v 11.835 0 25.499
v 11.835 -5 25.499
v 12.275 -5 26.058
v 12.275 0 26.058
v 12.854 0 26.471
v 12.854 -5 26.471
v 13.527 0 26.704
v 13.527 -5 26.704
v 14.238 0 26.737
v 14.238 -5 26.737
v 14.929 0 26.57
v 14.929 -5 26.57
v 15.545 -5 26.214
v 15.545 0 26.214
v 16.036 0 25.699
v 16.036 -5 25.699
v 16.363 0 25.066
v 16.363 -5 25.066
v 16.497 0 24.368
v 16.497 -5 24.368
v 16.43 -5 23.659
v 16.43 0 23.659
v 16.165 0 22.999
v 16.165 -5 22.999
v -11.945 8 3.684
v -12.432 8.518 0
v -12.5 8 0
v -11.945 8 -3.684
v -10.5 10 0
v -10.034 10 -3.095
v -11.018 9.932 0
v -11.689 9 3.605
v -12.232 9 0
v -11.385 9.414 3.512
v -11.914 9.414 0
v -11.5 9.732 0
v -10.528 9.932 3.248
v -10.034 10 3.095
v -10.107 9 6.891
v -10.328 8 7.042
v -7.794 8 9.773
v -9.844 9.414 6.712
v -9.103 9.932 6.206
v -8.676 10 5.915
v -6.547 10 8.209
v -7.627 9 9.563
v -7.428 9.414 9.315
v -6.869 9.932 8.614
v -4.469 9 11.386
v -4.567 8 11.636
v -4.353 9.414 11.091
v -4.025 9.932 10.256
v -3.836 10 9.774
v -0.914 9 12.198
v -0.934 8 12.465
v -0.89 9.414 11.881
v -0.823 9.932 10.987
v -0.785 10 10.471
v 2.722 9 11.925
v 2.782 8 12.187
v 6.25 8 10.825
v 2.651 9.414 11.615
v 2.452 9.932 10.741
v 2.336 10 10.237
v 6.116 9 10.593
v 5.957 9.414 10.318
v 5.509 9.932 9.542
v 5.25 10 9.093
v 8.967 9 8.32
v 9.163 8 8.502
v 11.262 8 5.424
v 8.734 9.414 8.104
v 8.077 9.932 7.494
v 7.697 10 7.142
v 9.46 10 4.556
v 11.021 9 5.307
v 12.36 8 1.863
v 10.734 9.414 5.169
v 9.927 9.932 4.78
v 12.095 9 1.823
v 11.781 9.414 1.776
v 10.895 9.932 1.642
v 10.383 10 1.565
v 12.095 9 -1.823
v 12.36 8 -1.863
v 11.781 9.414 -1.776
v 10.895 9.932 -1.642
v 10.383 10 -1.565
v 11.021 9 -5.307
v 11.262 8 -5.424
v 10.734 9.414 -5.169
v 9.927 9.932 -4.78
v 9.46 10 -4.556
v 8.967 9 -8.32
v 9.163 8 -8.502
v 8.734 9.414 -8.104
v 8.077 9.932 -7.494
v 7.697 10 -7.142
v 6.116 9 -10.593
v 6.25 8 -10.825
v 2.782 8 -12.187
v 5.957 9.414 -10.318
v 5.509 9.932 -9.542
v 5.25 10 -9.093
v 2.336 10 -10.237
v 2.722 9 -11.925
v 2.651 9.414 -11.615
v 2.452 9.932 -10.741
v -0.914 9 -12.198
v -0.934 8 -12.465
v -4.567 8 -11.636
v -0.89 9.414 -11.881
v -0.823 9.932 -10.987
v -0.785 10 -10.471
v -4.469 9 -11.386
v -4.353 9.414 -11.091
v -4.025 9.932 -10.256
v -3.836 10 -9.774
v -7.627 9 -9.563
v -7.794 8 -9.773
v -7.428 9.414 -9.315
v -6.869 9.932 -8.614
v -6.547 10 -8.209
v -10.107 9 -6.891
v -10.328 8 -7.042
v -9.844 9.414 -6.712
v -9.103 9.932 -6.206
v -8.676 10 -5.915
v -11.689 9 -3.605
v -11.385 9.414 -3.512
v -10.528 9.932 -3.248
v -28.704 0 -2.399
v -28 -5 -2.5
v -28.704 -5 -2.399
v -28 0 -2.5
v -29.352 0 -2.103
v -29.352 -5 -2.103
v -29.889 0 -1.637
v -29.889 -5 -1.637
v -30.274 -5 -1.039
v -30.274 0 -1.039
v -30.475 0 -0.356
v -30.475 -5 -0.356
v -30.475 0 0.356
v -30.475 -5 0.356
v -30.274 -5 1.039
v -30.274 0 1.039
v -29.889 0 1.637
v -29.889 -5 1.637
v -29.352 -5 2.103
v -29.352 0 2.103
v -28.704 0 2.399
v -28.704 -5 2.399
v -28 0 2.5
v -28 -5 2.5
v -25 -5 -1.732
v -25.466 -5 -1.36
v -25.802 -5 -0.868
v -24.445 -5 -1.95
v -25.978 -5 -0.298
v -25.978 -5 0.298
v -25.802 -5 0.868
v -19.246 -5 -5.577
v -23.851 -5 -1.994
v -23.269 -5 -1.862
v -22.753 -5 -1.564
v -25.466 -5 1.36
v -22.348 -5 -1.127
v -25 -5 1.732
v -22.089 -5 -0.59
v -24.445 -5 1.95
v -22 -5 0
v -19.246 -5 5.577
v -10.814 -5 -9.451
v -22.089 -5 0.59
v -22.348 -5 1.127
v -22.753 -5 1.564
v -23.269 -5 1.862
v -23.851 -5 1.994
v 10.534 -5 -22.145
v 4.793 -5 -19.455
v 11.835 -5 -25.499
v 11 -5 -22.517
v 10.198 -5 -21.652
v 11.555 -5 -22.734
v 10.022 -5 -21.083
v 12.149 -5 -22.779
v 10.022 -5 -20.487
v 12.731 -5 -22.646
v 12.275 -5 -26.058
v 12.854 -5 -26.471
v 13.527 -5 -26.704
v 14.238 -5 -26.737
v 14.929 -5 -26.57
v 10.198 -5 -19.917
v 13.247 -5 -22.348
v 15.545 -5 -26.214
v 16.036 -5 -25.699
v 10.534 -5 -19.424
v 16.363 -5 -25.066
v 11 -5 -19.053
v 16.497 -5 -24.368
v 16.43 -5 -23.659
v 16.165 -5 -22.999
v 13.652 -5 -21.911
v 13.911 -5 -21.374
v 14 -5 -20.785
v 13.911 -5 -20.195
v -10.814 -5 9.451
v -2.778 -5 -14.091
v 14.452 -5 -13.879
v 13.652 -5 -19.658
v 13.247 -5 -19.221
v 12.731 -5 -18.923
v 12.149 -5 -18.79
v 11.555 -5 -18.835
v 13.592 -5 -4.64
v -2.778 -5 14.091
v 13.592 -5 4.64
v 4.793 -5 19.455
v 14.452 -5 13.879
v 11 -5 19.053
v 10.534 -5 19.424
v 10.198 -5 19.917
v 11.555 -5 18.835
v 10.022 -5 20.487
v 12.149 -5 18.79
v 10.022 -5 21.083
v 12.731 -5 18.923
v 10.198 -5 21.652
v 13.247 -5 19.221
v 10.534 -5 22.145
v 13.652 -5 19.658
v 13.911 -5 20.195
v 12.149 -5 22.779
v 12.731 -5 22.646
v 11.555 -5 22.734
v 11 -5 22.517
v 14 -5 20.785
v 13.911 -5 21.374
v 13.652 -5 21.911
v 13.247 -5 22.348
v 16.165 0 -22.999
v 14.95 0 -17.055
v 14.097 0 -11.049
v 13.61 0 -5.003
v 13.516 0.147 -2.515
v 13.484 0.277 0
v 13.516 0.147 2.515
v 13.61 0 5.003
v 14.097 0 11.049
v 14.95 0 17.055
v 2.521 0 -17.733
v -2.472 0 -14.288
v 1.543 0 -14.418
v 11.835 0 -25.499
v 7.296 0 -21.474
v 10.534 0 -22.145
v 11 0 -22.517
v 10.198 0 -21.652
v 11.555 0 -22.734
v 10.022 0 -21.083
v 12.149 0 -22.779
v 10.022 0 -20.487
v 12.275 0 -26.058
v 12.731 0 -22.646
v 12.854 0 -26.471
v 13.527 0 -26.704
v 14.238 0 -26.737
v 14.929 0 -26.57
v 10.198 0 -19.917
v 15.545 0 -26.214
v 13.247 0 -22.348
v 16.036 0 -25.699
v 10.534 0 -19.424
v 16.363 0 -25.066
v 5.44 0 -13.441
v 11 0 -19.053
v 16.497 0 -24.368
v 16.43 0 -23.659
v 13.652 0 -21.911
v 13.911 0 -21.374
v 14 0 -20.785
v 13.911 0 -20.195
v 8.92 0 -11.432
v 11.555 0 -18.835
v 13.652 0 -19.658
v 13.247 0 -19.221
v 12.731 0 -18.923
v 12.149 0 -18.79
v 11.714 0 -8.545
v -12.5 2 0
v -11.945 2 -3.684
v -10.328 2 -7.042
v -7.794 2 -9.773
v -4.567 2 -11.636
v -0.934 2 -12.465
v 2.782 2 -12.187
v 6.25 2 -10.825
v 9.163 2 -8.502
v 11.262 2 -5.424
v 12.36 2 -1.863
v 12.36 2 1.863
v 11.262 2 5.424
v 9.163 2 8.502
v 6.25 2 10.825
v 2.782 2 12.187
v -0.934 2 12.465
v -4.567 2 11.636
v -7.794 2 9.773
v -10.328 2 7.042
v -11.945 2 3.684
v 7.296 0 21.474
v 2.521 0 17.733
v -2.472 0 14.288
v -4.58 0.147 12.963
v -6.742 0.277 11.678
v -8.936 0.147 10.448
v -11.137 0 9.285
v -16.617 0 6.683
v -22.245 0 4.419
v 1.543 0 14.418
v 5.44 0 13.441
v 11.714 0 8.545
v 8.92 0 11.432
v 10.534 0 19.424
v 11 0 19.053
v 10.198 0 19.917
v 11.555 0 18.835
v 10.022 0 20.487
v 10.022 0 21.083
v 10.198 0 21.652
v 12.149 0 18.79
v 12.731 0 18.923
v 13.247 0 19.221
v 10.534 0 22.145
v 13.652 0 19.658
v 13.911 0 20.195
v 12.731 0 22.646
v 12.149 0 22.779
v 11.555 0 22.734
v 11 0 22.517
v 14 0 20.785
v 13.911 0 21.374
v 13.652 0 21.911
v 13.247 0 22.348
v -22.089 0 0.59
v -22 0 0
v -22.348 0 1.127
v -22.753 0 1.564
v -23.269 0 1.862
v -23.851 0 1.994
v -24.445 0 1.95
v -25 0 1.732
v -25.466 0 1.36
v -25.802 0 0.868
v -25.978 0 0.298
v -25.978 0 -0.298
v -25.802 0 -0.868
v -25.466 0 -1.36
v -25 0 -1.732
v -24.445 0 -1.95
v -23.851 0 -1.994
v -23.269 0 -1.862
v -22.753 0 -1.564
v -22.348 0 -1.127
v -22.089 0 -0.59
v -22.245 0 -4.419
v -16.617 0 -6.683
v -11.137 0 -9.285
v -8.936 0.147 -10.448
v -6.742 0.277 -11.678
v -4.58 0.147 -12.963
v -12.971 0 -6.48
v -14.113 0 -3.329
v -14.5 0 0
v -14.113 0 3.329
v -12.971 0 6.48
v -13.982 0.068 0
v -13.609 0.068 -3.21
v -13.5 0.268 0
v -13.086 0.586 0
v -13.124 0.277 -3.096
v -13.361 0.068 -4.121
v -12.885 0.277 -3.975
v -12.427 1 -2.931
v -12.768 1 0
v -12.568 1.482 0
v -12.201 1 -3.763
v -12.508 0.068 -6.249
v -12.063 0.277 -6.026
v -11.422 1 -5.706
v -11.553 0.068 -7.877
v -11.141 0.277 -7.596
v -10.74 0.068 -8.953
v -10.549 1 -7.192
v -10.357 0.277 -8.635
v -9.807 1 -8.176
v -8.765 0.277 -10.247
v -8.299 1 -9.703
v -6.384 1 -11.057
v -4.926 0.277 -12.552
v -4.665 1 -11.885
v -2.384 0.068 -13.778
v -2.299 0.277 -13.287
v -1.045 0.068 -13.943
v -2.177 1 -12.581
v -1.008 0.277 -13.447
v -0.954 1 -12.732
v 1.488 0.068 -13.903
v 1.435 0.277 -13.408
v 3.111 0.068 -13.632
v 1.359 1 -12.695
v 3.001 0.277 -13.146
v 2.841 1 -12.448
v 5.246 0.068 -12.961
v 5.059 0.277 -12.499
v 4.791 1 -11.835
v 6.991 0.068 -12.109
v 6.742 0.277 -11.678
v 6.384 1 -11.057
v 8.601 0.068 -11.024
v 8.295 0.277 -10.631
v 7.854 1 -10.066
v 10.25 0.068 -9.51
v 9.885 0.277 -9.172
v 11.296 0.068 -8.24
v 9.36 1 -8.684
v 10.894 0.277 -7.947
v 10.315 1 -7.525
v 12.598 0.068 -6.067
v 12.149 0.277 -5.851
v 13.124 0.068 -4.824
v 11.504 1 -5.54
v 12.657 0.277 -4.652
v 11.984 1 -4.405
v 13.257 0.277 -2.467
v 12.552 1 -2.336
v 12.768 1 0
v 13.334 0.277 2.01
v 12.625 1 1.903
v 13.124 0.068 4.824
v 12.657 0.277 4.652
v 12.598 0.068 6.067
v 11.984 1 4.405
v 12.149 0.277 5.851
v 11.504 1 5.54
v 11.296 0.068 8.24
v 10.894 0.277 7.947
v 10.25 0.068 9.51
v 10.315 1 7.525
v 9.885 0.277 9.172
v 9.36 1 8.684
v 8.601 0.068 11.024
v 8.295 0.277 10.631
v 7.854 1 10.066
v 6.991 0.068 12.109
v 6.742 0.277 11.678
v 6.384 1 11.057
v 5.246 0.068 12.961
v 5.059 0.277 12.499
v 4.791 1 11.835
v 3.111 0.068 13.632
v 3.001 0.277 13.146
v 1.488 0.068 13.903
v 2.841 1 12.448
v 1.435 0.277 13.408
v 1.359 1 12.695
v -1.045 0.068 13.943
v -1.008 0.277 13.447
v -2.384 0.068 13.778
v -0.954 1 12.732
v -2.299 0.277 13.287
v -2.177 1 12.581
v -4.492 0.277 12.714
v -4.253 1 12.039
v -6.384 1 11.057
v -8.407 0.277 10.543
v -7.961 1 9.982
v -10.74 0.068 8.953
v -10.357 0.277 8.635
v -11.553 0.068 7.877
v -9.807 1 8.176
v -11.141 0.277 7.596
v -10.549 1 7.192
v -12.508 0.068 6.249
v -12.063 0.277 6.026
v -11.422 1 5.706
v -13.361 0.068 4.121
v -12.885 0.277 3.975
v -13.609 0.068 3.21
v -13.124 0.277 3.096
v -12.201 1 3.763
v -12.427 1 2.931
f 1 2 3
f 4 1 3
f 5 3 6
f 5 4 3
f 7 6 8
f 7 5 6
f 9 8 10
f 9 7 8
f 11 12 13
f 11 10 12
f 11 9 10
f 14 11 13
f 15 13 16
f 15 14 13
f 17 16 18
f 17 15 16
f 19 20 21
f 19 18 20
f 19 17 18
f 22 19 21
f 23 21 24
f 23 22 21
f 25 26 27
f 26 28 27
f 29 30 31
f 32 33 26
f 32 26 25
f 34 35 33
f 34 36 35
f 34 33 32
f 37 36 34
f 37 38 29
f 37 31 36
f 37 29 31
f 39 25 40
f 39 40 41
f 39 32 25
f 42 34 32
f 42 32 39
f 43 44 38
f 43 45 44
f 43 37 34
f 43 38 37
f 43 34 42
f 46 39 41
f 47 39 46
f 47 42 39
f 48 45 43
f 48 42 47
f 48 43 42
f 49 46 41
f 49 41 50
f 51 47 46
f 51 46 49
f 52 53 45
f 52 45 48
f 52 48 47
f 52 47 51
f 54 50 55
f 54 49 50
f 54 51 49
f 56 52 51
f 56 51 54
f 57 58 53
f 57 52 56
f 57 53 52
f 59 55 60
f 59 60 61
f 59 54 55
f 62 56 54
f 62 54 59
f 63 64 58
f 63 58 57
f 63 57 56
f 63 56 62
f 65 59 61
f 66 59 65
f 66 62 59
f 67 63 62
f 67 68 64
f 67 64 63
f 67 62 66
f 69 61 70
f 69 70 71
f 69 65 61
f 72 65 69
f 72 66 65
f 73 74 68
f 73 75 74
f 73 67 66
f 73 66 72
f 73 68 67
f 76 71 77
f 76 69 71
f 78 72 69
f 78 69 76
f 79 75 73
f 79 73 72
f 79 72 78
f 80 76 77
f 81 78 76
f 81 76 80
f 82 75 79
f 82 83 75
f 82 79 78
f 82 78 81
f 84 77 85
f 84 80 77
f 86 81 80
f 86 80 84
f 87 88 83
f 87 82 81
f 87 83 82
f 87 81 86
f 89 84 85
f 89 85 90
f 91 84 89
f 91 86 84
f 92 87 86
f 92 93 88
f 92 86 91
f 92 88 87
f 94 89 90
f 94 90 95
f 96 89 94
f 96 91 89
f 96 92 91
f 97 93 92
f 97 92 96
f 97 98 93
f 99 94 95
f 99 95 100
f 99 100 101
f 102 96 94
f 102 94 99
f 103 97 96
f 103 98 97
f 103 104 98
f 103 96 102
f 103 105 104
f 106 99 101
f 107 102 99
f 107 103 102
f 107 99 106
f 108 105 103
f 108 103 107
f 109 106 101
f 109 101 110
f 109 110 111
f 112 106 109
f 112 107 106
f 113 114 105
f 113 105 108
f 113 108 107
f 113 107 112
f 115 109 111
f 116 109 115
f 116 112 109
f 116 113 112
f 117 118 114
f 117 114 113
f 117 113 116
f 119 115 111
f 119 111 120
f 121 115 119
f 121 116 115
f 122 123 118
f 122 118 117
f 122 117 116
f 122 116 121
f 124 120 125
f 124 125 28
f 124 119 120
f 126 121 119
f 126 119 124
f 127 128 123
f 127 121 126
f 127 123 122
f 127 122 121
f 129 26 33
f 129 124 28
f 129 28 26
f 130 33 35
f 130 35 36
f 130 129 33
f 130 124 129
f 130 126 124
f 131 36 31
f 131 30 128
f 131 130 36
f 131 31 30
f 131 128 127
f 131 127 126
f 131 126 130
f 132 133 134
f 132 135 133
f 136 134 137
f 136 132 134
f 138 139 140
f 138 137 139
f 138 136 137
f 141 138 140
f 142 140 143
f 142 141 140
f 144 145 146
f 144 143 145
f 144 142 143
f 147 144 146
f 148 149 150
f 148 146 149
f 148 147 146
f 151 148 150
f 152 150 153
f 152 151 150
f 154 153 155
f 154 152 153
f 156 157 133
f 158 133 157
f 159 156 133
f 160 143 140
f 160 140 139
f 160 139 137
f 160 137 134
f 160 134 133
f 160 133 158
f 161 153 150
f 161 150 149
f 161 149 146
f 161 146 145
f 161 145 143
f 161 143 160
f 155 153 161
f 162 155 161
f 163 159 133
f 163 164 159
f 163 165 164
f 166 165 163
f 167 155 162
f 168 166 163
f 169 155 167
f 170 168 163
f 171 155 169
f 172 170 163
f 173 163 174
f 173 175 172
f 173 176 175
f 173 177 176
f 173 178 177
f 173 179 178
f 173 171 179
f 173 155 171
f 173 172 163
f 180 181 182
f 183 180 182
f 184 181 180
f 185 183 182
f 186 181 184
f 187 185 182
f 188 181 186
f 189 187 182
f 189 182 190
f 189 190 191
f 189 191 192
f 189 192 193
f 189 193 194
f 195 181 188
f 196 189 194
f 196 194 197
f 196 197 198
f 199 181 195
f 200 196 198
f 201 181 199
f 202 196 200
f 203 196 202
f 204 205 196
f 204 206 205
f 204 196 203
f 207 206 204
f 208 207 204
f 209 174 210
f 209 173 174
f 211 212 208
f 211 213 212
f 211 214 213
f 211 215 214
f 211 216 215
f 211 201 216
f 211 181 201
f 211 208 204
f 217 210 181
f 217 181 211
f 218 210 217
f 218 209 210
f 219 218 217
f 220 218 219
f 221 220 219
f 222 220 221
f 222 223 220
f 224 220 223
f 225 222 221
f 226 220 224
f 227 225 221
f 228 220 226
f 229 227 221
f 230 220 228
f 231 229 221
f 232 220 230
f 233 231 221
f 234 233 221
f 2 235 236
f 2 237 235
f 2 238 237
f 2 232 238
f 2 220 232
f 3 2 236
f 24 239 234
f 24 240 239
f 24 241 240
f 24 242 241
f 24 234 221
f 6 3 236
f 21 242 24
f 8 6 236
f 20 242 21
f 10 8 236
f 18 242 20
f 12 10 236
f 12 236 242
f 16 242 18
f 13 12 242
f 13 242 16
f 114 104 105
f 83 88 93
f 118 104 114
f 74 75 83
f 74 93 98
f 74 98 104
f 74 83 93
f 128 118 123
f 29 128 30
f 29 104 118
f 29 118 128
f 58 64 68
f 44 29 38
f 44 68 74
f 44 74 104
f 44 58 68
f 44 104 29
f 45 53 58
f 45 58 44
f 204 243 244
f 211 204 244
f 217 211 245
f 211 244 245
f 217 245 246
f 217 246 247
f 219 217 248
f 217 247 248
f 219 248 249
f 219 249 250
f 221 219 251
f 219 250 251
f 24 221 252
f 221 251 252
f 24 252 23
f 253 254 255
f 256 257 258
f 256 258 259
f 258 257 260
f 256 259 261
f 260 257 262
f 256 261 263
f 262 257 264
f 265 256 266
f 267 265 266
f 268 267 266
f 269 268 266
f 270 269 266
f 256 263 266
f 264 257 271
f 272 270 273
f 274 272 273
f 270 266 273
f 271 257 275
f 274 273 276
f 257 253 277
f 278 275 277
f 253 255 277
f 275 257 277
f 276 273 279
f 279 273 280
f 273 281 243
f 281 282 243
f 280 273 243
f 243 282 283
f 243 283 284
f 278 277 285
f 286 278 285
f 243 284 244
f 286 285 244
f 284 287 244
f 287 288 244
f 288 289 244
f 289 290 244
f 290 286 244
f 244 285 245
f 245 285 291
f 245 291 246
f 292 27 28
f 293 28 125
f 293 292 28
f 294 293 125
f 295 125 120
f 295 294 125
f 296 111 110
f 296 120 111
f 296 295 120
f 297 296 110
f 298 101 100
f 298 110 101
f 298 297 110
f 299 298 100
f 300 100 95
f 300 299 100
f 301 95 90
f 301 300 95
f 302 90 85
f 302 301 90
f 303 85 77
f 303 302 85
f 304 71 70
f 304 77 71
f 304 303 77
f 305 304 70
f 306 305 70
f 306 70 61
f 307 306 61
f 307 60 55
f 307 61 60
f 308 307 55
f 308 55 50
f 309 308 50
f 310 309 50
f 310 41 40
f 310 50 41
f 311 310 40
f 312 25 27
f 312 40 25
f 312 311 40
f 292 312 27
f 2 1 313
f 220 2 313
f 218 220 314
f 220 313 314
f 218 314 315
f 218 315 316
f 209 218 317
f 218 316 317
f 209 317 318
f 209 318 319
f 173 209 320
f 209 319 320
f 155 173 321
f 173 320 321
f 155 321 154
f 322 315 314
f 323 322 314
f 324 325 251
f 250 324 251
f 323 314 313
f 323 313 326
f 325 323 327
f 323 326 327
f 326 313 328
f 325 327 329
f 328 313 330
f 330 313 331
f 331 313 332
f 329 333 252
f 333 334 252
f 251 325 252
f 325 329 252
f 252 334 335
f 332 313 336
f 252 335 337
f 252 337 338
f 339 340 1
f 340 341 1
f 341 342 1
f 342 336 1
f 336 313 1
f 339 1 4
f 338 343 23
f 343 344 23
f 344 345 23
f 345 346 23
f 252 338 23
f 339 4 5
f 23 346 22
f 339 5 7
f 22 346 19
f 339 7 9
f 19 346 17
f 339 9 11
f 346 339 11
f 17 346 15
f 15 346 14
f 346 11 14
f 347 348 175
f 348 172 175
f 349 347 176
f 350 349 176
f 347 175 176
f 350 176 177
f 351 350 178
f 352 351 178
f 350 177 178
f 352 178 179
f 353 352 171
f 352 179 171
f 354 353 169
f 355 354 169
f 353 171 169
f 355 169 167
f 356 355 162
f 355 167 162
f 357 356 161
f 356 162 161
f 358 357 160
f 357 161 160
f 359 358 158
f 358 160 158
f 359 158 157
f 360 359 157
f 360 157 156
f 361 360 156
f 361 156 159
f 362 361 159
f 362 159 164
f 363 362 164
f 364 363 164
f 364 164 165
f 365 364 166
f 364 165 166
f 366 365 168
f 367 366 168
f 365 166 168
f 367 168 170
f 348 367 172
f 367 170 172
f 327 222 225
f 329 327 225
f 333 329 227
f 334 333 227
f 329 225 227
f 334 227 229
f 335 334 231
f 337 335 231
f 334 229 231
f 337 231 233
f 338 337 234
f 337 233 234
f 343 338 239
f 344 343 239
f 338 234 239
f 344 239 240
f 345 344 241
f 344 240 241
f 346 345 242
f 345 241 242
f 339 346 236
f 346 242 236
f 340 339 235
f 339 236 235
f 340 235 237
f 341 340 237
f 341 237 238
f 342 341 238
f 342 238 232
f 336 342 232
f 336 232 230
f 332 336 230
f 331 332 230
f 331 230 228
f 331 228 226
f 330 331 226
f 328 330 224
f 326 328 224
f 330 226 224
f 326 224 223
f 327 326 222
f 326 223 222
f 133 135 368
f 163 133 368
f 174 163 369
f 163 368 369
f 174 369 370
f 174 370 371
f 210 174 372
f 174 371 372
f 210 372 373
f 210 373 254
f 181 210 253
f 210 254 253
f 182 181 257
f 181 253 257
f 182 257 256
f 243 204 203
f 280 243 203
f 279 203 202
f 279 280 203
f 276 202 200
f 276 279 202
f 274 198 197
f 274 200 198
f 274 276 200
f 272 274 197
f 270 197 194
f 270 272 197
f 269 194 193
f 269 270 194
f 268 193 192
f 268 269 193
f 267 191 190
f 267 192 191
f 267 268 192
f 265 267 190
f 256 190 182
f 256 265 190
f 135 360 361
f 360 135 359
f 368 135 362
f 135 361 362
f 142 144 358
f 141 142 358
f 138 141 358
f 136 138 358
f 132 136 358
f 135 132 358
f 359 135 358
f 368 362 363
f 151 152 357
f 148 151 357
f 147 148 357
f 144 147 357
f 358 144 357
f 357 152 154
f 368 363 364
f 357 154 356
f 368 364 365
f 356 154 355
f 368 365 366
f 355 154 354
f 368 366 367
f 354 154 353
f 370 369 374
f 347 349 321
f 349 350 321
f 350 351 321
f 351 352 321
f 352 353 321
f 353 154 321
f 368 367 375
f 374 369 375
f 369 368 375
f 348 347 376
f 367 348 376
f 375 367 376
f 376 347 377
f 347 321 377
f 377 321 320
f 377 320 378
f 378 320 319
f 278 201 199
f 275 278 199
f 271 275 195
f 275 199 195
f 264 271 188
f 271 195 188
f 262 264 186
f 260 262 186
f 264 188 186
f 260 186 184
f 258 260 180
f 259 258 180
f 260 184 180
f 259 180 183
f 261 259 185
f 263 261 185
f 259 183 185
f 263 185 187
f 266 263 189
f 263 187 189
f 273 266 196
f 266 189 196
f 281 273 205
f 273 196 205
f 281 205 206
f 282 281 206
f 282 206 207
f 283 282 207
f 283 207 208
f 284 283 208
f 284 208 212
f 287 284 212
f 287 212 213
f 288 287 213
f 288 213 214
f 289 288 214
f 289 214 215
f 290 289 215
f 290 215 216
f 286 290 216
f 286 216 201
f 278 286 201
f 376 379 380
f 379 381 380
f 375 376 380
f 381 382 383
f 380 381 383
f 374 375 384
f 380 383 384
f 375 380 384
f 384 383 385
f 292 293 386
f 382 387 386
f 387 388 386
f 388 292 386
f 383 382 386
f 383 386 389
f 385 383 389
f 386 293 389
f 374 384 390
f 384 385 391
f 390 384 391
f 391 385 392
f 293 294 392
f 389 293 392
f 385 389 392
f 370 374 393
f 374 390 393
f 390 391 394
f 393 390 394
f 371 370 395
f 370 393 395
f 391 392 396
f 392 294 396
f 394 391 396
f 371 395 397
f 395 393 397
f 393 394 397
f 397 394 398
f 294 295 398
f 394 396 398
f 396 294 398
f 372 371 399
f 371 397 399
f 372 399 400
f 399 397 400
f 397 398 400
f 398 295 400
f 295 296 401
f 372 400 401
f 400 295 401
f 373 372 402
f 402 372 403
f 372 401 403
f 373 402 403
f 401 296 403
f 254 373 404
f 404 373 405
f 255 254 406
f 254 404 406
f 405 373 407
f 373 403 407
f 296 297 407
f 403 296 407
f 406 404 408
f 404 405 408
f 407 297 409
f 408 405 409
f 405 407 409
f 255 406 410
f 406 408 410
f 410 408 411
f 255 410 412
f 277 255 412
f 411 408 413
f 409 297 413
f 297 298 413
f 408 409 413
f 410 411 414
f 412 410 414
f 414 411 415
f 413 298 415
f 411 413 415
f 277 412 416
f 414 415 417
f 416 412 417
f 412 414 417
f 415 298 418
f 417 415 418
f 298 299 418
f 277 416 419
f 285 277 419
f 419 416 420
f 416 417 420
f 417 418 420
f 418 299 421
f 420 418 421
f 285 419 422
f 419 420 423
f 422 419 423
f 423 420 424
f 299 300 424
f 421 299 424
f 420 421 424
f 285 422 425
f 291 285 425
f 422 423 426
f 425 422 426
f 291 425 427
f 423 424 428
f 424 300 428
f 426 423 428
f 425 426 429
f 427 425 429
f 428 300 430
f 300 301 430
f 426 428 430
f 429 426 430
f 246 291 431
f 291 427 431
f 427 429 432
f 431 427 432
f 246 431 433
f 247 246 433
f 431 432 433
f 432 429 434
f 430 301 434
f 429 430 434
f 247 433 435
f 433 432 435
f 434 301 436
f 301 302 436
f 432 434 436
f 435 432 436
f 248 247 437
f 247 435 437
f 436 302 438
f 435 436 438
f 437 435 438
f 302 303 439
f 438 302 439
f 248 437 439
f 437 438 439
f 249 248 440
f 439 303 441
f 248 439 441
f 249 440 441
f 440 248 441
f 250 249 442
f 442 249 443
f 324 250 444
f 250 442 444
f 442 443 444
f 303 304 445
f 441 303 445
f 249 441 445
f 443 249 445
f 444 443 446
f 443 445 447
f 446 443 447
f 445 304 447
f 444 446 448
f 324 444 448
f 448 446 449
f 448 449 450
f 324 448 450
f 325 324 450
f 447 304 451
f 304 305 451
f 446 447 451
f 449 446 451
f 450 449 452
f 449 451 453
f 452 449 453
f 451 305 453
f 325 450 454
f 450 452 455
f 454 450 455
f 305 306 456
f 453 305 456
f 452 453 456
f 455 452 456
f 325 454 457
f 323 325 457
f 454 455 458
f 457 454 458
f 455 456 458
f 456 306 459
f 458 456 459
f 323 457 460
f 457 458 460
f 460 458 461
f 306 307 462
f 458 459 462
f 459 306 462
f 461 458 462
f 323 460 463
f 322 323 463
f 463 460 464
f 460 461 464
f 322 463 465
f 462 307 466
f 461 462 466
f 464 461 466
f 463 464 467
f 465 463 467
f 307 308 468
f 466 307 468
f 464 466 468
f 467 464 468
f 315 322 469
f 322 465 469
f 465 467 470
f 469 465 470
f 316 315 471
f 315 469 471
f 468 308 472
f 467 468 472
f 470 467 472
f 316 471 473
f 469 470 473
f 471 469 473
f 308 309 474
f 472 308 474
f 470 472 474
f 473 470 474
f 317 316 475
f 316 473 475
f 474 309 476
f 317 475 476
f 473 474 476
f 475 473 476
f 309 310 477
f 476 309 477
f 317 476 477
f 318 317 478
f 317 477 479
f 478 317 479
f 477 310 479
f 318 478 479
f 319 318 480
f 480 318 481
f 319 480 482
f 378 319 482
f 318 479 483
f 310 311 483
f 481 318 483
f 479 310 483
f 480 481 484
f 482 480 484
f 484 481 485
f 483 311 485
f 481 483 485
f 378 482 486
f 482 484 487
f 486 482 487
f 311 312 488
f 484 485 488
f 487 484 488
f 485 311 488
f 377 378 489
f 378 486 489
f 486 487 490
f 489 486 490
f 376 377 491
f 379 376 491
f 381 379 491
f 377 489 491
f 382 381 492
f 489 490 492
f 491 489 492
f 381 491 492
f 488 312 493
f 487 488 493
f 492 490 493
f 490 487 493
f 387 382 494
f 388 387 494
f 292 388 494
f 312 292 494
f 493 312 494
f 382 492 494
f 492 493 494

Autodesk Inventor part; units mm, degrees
ref_plane "YZ Plane" through (0, 0, 0) normal (1, 0, 0) x (0, 1, 0)
ref_plane "XZ Plane" through (0, 0, 0) normal (0, 1, 0) x (-1, 0, 0)
ref_plane "XY Plane" through (0, 0, 0) normal (0, 0, 1) x (1, 0, 0)
sketch "Sketch1" plane through (0, 0, 0) normal (0, 1, 0) x (-1, 0, 0)
  circle A0 centre (0, 0) radius 12.5
  circle A1 centre (0, 0) radius 12
  dimension "d0" = 25
  dimension "d1" = 24
extrude "Extrusion1" add sketch "Sketch1" along normal blind 10 contours A0 | A1
sketch "Sketch2" plane through (0, 0, 0) normal (0, -1, 0) x (1, 0, 0)
  line L0 (0, 0) -> (-28, 0)
  line L1 (0, 0) -> (14, -24.2487)
  line L2 (0, 0) -> (14, 24.2487)
  line L3 (0, 2.5) -> (-28, 2.5)
  line L4 (0, -2.5) -> (-28, -2.5)
  arc A0 (-28, 2.5) -> (-28, -2.5) centre (-28, 0) ccw
  line L5 (2.1651, 1.25) -> (16.1651, -22.9987)
  line L6 (-2.1651, -1.25) -> (11.8349, -25.4987)
  arc A1 (11.8349, -25.4987) -> (16.1651, -22.9987) centre (14, -24.2487) ccw
  line L7 (-2.1651, 1.25) -> (11.8349, 25.4987)
  line L8 (2.1651, -1.25) -> (16.1651, 22.9987)
  arc A2 (16.1651, 22.9987) -> (11.8349, 25.4987) centre (14, 24.2487) ccw
  arc A3 (11.8349, -25.4987) -> (-28, -2.5) centre (-56.7422, -98.2804) ccw
  arc A4 (16.1651, 22.9987) -> (16.1651, -22.9987) centre (113.4844, 0) ccw
  arc A5 (-28, 2.5) -> (11.8349, 25.4987) centre (-56.7422, 98.2804) ccw
  dimension "d4" = 28
  dimension "d7" = 360
  dimension "d9" = 2.5
  dimension "d10" = 2.5
  dimension "d11" = 2.5
  dimension "d14" = 360
  dimension "d16" = 100
  dimension "d19" = 360
extrude "Extrusion2" add sketch "Sketch2" along normal blind 5
fillet "Fillet1" radius 2 2 edges at (12.5, 0, 0) (12.5, 10, 0)
sketch "Sketch3" plane through (0, -5, 0) normal (0, -1, 0) x (1, 0, 0)
  circle A0 centre (0, 0) radius 10.5
  line L0 (0, 0) -> (-24, 0)
  circle A1 centre (-24, 0) radius 2
  dimension "d24" = 24
  dimension "d25" = 4
extrude "Extrusion3" cut sketch "Sketch3" against normal blind 5 contours A1
pattern_circular "Circular Pattern1" count 3 over 360 about axis through (0, 0, 0) along (0, 1, 0) of "Extrusion3"
properties part number "Portaplanetas"
